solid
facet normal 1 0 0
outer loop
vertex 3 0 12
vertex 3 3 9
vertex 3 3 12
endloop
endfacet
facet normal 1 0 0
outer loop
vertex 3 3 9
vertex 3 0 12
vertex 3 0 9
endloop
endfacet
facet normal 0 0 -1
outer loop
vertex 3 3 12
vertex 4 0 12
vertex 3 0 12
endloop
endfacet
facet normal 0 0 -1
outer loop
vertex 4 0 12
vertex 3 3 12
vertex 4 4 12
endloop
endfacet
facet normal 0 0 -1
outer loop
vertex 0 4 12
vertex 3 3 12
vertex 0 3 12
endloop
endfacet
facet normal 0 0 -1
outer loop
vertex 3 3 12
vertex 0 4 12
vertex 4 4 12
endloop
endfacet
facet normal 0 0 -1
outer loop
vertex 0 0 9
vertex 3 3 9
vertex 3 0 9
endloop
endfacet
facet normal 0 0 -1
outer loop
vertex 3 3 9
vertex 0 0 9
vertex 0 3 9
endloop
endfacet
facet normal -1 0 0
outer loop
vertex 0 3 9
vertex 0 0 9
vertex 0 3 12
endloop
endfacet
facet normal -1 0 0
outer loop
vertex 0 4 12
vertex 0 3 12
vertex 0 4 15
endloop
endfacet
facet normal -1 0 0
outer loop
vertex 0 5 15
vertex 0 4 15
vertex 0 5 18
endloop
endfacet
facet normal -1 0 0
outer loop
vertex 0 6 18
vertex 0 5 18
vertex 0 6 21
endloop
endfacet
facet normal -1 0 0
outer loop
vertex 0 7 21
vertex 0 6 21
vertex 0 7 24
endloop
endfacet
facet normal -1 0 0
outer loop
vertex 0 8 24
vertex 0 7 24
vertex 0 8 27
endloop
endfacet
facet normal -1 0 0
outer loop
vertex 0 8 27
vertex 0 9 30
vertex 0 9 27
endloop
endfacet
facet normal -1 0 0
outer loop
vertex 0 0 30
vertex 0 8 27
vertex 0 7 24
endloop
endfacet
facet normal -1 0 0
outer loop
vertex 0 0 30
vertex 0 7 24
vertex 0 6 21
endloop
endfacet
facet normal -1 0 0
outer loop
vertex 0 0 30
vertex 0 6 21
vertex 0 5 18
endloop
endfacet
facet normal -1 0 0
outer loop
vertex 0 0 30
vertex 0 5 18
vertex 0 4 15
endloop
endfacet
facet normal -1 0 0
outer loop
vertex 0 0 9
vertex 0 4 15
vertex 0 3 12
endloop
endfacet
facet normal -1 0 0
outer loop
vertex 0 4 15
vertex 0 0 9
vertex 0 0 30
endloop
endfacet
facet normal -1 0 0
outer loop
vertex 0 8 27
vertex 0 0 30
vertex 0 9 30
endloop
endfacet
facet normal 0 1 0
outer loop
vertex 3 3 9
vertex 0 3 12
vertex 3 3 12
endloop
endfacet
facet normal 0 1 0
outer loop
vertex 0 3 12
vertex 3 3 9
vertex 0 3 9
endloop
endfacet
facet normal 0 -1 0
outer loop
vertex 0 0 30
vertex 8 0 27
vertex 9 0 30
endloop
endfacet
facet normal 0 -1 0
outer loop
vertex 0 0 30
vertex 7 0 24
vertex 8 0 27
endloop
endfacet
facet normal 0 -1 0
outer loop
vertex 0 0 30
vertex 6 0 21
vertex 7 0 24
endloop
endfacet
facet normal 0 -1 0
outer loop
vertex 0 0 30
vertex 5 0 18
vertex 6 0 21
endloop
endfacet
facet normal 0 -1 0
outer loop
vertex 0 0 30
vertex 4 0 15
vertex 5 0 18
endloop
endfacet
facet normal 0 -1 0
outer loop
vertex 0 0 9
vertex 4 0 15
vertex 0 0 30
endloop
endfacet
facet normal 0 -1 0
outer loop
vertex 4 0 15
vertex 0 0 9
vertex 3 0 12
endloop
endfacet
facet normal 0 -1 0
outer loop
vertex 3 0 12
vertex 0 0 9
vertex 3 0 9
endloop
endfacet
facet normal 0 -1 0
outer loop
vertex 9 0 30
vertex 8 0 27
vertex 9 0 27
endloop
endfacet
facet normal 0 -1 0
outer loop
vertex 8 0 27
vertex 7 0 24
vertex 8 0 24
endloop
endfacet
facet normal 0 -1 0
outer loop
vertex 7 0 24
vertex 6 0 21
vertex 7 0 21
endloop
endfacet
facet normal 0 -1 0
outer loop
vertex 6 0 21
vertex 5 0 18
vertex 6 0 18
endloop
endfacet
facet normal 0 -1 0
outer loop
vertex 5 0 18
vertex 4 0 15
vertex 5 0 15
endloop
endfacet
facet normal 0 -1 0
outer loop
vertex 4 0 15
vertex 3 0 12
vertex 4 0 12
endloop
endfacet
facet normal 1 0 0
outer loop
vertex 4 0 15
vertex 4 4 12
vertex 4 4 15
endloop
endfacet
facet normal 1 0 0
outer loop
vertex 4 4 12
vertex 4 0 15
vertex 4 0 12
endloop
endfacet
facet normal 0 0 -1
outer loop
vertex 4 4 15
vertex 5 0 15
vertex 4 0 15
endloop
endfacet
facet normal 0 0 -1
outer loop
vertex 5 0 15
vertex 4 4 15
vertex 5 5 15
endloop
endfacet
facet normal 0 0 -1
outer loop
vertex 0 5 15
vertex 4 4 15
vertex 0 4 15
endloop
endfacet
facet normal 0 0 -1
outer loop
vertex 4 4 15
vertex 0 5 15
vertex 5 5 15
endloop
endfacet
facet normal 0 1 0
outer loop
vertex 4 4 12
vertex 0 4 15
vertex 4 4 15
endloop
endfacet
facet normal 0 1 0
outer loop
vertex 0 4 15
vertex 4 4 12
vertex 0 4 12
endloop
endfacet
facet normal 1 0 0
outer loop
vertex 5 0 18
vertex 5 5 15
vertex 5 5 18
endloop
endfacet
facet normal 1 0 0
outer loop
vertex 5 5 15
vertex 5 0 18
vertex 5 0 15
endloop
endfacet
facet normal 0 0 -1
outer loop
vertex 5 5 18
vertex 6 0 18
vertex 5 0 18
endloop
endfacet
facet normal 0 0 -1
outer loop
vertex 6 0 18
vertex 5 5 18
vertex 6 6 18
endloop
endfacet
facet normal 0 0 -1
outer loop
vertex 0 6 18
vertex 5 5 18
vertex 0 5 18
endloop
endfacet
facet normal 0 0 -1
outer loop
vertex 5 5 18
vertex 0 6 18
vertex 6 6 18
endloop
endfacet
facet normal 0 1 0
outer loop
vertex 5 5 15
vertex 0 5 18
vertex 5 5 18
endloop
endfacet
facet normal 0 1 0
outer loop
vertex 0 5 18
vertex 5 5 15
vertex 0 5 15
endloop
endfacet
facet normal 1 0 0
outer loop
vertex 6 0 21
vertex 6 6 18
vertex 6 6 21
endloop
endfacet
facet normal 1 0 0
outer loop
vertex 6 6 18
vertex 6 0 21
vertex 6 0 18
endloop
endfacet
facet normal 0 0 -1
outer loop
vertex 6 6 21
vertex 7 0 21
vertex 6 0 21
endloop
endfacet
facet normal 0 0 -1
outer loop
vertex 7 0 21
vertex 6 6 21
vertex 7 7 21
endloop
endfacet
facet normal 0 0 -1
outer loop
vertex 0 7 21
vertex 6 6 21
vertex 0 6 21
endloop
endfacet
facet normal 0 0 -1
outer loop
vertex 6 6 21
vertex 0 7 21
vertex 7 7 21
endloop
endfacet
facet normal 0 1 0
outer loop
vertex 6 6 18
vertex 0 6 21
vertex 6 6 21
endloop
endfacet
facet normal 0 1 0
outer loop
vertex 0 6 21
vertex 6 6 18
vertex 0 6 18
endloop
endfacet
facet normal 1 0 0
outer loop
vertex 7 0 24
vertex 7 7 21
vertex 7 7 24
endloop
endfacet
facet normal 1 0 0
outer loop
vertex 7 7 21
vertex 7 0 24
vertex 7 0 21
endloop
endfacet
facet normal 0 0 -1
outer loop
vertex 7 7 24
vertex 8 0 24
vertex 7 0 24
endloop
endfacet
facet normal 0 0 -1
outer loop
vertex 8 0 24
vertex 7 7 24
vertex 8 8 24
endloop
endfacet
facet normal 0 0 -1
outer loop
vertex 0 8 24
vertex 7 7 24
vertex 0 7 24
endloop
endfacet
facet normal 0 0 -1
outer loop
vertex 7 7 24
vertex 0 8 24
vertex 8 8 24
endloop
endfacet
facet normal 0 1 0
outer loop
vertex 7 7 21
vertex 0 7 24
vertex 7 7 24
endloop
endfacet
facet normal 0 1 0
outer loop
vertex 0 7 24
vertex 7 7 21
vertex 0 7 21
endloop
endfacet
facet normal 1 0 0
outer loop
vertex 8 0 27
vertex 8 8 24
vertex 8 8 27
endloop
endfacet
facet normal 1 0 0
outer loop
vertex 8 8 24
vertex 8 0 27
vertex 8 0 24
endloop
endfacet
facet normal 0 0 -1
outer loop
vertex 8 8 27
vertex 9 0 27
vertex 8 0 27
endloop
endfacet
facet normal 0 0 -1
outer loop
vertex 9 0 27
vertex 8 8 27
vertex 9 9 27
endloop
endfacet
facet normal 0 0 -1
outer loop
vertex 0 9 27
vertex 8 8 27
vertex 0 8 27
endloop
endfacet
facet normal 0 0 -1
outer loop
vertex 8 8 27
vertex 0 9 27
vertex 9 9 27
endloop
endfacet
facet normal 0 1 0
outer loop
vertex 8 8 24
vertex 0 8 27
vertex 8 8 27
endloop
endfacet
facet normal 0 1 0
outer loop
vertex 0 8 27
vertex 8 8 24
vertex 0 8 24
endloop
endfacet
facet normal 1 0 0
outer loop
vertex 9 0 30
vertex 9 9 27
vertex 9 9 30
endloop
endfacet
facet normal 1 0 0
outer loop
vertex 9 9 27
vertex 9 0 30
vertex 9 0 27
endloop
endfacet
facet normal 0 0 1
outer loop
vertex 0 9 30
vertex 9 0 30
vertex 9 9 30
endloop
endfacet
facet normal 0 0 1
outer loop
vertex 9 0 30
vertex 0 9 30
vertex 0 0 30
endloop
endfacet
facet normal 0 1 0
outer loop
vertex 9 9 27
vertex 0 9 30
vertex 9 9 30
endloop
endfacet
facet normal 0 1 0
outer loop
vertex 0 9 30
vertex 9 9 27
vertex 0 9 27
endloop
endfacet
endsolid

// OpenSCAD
for (i=[3:9])
    translate([0,0,3*i])
        cube([i,i,3]);
